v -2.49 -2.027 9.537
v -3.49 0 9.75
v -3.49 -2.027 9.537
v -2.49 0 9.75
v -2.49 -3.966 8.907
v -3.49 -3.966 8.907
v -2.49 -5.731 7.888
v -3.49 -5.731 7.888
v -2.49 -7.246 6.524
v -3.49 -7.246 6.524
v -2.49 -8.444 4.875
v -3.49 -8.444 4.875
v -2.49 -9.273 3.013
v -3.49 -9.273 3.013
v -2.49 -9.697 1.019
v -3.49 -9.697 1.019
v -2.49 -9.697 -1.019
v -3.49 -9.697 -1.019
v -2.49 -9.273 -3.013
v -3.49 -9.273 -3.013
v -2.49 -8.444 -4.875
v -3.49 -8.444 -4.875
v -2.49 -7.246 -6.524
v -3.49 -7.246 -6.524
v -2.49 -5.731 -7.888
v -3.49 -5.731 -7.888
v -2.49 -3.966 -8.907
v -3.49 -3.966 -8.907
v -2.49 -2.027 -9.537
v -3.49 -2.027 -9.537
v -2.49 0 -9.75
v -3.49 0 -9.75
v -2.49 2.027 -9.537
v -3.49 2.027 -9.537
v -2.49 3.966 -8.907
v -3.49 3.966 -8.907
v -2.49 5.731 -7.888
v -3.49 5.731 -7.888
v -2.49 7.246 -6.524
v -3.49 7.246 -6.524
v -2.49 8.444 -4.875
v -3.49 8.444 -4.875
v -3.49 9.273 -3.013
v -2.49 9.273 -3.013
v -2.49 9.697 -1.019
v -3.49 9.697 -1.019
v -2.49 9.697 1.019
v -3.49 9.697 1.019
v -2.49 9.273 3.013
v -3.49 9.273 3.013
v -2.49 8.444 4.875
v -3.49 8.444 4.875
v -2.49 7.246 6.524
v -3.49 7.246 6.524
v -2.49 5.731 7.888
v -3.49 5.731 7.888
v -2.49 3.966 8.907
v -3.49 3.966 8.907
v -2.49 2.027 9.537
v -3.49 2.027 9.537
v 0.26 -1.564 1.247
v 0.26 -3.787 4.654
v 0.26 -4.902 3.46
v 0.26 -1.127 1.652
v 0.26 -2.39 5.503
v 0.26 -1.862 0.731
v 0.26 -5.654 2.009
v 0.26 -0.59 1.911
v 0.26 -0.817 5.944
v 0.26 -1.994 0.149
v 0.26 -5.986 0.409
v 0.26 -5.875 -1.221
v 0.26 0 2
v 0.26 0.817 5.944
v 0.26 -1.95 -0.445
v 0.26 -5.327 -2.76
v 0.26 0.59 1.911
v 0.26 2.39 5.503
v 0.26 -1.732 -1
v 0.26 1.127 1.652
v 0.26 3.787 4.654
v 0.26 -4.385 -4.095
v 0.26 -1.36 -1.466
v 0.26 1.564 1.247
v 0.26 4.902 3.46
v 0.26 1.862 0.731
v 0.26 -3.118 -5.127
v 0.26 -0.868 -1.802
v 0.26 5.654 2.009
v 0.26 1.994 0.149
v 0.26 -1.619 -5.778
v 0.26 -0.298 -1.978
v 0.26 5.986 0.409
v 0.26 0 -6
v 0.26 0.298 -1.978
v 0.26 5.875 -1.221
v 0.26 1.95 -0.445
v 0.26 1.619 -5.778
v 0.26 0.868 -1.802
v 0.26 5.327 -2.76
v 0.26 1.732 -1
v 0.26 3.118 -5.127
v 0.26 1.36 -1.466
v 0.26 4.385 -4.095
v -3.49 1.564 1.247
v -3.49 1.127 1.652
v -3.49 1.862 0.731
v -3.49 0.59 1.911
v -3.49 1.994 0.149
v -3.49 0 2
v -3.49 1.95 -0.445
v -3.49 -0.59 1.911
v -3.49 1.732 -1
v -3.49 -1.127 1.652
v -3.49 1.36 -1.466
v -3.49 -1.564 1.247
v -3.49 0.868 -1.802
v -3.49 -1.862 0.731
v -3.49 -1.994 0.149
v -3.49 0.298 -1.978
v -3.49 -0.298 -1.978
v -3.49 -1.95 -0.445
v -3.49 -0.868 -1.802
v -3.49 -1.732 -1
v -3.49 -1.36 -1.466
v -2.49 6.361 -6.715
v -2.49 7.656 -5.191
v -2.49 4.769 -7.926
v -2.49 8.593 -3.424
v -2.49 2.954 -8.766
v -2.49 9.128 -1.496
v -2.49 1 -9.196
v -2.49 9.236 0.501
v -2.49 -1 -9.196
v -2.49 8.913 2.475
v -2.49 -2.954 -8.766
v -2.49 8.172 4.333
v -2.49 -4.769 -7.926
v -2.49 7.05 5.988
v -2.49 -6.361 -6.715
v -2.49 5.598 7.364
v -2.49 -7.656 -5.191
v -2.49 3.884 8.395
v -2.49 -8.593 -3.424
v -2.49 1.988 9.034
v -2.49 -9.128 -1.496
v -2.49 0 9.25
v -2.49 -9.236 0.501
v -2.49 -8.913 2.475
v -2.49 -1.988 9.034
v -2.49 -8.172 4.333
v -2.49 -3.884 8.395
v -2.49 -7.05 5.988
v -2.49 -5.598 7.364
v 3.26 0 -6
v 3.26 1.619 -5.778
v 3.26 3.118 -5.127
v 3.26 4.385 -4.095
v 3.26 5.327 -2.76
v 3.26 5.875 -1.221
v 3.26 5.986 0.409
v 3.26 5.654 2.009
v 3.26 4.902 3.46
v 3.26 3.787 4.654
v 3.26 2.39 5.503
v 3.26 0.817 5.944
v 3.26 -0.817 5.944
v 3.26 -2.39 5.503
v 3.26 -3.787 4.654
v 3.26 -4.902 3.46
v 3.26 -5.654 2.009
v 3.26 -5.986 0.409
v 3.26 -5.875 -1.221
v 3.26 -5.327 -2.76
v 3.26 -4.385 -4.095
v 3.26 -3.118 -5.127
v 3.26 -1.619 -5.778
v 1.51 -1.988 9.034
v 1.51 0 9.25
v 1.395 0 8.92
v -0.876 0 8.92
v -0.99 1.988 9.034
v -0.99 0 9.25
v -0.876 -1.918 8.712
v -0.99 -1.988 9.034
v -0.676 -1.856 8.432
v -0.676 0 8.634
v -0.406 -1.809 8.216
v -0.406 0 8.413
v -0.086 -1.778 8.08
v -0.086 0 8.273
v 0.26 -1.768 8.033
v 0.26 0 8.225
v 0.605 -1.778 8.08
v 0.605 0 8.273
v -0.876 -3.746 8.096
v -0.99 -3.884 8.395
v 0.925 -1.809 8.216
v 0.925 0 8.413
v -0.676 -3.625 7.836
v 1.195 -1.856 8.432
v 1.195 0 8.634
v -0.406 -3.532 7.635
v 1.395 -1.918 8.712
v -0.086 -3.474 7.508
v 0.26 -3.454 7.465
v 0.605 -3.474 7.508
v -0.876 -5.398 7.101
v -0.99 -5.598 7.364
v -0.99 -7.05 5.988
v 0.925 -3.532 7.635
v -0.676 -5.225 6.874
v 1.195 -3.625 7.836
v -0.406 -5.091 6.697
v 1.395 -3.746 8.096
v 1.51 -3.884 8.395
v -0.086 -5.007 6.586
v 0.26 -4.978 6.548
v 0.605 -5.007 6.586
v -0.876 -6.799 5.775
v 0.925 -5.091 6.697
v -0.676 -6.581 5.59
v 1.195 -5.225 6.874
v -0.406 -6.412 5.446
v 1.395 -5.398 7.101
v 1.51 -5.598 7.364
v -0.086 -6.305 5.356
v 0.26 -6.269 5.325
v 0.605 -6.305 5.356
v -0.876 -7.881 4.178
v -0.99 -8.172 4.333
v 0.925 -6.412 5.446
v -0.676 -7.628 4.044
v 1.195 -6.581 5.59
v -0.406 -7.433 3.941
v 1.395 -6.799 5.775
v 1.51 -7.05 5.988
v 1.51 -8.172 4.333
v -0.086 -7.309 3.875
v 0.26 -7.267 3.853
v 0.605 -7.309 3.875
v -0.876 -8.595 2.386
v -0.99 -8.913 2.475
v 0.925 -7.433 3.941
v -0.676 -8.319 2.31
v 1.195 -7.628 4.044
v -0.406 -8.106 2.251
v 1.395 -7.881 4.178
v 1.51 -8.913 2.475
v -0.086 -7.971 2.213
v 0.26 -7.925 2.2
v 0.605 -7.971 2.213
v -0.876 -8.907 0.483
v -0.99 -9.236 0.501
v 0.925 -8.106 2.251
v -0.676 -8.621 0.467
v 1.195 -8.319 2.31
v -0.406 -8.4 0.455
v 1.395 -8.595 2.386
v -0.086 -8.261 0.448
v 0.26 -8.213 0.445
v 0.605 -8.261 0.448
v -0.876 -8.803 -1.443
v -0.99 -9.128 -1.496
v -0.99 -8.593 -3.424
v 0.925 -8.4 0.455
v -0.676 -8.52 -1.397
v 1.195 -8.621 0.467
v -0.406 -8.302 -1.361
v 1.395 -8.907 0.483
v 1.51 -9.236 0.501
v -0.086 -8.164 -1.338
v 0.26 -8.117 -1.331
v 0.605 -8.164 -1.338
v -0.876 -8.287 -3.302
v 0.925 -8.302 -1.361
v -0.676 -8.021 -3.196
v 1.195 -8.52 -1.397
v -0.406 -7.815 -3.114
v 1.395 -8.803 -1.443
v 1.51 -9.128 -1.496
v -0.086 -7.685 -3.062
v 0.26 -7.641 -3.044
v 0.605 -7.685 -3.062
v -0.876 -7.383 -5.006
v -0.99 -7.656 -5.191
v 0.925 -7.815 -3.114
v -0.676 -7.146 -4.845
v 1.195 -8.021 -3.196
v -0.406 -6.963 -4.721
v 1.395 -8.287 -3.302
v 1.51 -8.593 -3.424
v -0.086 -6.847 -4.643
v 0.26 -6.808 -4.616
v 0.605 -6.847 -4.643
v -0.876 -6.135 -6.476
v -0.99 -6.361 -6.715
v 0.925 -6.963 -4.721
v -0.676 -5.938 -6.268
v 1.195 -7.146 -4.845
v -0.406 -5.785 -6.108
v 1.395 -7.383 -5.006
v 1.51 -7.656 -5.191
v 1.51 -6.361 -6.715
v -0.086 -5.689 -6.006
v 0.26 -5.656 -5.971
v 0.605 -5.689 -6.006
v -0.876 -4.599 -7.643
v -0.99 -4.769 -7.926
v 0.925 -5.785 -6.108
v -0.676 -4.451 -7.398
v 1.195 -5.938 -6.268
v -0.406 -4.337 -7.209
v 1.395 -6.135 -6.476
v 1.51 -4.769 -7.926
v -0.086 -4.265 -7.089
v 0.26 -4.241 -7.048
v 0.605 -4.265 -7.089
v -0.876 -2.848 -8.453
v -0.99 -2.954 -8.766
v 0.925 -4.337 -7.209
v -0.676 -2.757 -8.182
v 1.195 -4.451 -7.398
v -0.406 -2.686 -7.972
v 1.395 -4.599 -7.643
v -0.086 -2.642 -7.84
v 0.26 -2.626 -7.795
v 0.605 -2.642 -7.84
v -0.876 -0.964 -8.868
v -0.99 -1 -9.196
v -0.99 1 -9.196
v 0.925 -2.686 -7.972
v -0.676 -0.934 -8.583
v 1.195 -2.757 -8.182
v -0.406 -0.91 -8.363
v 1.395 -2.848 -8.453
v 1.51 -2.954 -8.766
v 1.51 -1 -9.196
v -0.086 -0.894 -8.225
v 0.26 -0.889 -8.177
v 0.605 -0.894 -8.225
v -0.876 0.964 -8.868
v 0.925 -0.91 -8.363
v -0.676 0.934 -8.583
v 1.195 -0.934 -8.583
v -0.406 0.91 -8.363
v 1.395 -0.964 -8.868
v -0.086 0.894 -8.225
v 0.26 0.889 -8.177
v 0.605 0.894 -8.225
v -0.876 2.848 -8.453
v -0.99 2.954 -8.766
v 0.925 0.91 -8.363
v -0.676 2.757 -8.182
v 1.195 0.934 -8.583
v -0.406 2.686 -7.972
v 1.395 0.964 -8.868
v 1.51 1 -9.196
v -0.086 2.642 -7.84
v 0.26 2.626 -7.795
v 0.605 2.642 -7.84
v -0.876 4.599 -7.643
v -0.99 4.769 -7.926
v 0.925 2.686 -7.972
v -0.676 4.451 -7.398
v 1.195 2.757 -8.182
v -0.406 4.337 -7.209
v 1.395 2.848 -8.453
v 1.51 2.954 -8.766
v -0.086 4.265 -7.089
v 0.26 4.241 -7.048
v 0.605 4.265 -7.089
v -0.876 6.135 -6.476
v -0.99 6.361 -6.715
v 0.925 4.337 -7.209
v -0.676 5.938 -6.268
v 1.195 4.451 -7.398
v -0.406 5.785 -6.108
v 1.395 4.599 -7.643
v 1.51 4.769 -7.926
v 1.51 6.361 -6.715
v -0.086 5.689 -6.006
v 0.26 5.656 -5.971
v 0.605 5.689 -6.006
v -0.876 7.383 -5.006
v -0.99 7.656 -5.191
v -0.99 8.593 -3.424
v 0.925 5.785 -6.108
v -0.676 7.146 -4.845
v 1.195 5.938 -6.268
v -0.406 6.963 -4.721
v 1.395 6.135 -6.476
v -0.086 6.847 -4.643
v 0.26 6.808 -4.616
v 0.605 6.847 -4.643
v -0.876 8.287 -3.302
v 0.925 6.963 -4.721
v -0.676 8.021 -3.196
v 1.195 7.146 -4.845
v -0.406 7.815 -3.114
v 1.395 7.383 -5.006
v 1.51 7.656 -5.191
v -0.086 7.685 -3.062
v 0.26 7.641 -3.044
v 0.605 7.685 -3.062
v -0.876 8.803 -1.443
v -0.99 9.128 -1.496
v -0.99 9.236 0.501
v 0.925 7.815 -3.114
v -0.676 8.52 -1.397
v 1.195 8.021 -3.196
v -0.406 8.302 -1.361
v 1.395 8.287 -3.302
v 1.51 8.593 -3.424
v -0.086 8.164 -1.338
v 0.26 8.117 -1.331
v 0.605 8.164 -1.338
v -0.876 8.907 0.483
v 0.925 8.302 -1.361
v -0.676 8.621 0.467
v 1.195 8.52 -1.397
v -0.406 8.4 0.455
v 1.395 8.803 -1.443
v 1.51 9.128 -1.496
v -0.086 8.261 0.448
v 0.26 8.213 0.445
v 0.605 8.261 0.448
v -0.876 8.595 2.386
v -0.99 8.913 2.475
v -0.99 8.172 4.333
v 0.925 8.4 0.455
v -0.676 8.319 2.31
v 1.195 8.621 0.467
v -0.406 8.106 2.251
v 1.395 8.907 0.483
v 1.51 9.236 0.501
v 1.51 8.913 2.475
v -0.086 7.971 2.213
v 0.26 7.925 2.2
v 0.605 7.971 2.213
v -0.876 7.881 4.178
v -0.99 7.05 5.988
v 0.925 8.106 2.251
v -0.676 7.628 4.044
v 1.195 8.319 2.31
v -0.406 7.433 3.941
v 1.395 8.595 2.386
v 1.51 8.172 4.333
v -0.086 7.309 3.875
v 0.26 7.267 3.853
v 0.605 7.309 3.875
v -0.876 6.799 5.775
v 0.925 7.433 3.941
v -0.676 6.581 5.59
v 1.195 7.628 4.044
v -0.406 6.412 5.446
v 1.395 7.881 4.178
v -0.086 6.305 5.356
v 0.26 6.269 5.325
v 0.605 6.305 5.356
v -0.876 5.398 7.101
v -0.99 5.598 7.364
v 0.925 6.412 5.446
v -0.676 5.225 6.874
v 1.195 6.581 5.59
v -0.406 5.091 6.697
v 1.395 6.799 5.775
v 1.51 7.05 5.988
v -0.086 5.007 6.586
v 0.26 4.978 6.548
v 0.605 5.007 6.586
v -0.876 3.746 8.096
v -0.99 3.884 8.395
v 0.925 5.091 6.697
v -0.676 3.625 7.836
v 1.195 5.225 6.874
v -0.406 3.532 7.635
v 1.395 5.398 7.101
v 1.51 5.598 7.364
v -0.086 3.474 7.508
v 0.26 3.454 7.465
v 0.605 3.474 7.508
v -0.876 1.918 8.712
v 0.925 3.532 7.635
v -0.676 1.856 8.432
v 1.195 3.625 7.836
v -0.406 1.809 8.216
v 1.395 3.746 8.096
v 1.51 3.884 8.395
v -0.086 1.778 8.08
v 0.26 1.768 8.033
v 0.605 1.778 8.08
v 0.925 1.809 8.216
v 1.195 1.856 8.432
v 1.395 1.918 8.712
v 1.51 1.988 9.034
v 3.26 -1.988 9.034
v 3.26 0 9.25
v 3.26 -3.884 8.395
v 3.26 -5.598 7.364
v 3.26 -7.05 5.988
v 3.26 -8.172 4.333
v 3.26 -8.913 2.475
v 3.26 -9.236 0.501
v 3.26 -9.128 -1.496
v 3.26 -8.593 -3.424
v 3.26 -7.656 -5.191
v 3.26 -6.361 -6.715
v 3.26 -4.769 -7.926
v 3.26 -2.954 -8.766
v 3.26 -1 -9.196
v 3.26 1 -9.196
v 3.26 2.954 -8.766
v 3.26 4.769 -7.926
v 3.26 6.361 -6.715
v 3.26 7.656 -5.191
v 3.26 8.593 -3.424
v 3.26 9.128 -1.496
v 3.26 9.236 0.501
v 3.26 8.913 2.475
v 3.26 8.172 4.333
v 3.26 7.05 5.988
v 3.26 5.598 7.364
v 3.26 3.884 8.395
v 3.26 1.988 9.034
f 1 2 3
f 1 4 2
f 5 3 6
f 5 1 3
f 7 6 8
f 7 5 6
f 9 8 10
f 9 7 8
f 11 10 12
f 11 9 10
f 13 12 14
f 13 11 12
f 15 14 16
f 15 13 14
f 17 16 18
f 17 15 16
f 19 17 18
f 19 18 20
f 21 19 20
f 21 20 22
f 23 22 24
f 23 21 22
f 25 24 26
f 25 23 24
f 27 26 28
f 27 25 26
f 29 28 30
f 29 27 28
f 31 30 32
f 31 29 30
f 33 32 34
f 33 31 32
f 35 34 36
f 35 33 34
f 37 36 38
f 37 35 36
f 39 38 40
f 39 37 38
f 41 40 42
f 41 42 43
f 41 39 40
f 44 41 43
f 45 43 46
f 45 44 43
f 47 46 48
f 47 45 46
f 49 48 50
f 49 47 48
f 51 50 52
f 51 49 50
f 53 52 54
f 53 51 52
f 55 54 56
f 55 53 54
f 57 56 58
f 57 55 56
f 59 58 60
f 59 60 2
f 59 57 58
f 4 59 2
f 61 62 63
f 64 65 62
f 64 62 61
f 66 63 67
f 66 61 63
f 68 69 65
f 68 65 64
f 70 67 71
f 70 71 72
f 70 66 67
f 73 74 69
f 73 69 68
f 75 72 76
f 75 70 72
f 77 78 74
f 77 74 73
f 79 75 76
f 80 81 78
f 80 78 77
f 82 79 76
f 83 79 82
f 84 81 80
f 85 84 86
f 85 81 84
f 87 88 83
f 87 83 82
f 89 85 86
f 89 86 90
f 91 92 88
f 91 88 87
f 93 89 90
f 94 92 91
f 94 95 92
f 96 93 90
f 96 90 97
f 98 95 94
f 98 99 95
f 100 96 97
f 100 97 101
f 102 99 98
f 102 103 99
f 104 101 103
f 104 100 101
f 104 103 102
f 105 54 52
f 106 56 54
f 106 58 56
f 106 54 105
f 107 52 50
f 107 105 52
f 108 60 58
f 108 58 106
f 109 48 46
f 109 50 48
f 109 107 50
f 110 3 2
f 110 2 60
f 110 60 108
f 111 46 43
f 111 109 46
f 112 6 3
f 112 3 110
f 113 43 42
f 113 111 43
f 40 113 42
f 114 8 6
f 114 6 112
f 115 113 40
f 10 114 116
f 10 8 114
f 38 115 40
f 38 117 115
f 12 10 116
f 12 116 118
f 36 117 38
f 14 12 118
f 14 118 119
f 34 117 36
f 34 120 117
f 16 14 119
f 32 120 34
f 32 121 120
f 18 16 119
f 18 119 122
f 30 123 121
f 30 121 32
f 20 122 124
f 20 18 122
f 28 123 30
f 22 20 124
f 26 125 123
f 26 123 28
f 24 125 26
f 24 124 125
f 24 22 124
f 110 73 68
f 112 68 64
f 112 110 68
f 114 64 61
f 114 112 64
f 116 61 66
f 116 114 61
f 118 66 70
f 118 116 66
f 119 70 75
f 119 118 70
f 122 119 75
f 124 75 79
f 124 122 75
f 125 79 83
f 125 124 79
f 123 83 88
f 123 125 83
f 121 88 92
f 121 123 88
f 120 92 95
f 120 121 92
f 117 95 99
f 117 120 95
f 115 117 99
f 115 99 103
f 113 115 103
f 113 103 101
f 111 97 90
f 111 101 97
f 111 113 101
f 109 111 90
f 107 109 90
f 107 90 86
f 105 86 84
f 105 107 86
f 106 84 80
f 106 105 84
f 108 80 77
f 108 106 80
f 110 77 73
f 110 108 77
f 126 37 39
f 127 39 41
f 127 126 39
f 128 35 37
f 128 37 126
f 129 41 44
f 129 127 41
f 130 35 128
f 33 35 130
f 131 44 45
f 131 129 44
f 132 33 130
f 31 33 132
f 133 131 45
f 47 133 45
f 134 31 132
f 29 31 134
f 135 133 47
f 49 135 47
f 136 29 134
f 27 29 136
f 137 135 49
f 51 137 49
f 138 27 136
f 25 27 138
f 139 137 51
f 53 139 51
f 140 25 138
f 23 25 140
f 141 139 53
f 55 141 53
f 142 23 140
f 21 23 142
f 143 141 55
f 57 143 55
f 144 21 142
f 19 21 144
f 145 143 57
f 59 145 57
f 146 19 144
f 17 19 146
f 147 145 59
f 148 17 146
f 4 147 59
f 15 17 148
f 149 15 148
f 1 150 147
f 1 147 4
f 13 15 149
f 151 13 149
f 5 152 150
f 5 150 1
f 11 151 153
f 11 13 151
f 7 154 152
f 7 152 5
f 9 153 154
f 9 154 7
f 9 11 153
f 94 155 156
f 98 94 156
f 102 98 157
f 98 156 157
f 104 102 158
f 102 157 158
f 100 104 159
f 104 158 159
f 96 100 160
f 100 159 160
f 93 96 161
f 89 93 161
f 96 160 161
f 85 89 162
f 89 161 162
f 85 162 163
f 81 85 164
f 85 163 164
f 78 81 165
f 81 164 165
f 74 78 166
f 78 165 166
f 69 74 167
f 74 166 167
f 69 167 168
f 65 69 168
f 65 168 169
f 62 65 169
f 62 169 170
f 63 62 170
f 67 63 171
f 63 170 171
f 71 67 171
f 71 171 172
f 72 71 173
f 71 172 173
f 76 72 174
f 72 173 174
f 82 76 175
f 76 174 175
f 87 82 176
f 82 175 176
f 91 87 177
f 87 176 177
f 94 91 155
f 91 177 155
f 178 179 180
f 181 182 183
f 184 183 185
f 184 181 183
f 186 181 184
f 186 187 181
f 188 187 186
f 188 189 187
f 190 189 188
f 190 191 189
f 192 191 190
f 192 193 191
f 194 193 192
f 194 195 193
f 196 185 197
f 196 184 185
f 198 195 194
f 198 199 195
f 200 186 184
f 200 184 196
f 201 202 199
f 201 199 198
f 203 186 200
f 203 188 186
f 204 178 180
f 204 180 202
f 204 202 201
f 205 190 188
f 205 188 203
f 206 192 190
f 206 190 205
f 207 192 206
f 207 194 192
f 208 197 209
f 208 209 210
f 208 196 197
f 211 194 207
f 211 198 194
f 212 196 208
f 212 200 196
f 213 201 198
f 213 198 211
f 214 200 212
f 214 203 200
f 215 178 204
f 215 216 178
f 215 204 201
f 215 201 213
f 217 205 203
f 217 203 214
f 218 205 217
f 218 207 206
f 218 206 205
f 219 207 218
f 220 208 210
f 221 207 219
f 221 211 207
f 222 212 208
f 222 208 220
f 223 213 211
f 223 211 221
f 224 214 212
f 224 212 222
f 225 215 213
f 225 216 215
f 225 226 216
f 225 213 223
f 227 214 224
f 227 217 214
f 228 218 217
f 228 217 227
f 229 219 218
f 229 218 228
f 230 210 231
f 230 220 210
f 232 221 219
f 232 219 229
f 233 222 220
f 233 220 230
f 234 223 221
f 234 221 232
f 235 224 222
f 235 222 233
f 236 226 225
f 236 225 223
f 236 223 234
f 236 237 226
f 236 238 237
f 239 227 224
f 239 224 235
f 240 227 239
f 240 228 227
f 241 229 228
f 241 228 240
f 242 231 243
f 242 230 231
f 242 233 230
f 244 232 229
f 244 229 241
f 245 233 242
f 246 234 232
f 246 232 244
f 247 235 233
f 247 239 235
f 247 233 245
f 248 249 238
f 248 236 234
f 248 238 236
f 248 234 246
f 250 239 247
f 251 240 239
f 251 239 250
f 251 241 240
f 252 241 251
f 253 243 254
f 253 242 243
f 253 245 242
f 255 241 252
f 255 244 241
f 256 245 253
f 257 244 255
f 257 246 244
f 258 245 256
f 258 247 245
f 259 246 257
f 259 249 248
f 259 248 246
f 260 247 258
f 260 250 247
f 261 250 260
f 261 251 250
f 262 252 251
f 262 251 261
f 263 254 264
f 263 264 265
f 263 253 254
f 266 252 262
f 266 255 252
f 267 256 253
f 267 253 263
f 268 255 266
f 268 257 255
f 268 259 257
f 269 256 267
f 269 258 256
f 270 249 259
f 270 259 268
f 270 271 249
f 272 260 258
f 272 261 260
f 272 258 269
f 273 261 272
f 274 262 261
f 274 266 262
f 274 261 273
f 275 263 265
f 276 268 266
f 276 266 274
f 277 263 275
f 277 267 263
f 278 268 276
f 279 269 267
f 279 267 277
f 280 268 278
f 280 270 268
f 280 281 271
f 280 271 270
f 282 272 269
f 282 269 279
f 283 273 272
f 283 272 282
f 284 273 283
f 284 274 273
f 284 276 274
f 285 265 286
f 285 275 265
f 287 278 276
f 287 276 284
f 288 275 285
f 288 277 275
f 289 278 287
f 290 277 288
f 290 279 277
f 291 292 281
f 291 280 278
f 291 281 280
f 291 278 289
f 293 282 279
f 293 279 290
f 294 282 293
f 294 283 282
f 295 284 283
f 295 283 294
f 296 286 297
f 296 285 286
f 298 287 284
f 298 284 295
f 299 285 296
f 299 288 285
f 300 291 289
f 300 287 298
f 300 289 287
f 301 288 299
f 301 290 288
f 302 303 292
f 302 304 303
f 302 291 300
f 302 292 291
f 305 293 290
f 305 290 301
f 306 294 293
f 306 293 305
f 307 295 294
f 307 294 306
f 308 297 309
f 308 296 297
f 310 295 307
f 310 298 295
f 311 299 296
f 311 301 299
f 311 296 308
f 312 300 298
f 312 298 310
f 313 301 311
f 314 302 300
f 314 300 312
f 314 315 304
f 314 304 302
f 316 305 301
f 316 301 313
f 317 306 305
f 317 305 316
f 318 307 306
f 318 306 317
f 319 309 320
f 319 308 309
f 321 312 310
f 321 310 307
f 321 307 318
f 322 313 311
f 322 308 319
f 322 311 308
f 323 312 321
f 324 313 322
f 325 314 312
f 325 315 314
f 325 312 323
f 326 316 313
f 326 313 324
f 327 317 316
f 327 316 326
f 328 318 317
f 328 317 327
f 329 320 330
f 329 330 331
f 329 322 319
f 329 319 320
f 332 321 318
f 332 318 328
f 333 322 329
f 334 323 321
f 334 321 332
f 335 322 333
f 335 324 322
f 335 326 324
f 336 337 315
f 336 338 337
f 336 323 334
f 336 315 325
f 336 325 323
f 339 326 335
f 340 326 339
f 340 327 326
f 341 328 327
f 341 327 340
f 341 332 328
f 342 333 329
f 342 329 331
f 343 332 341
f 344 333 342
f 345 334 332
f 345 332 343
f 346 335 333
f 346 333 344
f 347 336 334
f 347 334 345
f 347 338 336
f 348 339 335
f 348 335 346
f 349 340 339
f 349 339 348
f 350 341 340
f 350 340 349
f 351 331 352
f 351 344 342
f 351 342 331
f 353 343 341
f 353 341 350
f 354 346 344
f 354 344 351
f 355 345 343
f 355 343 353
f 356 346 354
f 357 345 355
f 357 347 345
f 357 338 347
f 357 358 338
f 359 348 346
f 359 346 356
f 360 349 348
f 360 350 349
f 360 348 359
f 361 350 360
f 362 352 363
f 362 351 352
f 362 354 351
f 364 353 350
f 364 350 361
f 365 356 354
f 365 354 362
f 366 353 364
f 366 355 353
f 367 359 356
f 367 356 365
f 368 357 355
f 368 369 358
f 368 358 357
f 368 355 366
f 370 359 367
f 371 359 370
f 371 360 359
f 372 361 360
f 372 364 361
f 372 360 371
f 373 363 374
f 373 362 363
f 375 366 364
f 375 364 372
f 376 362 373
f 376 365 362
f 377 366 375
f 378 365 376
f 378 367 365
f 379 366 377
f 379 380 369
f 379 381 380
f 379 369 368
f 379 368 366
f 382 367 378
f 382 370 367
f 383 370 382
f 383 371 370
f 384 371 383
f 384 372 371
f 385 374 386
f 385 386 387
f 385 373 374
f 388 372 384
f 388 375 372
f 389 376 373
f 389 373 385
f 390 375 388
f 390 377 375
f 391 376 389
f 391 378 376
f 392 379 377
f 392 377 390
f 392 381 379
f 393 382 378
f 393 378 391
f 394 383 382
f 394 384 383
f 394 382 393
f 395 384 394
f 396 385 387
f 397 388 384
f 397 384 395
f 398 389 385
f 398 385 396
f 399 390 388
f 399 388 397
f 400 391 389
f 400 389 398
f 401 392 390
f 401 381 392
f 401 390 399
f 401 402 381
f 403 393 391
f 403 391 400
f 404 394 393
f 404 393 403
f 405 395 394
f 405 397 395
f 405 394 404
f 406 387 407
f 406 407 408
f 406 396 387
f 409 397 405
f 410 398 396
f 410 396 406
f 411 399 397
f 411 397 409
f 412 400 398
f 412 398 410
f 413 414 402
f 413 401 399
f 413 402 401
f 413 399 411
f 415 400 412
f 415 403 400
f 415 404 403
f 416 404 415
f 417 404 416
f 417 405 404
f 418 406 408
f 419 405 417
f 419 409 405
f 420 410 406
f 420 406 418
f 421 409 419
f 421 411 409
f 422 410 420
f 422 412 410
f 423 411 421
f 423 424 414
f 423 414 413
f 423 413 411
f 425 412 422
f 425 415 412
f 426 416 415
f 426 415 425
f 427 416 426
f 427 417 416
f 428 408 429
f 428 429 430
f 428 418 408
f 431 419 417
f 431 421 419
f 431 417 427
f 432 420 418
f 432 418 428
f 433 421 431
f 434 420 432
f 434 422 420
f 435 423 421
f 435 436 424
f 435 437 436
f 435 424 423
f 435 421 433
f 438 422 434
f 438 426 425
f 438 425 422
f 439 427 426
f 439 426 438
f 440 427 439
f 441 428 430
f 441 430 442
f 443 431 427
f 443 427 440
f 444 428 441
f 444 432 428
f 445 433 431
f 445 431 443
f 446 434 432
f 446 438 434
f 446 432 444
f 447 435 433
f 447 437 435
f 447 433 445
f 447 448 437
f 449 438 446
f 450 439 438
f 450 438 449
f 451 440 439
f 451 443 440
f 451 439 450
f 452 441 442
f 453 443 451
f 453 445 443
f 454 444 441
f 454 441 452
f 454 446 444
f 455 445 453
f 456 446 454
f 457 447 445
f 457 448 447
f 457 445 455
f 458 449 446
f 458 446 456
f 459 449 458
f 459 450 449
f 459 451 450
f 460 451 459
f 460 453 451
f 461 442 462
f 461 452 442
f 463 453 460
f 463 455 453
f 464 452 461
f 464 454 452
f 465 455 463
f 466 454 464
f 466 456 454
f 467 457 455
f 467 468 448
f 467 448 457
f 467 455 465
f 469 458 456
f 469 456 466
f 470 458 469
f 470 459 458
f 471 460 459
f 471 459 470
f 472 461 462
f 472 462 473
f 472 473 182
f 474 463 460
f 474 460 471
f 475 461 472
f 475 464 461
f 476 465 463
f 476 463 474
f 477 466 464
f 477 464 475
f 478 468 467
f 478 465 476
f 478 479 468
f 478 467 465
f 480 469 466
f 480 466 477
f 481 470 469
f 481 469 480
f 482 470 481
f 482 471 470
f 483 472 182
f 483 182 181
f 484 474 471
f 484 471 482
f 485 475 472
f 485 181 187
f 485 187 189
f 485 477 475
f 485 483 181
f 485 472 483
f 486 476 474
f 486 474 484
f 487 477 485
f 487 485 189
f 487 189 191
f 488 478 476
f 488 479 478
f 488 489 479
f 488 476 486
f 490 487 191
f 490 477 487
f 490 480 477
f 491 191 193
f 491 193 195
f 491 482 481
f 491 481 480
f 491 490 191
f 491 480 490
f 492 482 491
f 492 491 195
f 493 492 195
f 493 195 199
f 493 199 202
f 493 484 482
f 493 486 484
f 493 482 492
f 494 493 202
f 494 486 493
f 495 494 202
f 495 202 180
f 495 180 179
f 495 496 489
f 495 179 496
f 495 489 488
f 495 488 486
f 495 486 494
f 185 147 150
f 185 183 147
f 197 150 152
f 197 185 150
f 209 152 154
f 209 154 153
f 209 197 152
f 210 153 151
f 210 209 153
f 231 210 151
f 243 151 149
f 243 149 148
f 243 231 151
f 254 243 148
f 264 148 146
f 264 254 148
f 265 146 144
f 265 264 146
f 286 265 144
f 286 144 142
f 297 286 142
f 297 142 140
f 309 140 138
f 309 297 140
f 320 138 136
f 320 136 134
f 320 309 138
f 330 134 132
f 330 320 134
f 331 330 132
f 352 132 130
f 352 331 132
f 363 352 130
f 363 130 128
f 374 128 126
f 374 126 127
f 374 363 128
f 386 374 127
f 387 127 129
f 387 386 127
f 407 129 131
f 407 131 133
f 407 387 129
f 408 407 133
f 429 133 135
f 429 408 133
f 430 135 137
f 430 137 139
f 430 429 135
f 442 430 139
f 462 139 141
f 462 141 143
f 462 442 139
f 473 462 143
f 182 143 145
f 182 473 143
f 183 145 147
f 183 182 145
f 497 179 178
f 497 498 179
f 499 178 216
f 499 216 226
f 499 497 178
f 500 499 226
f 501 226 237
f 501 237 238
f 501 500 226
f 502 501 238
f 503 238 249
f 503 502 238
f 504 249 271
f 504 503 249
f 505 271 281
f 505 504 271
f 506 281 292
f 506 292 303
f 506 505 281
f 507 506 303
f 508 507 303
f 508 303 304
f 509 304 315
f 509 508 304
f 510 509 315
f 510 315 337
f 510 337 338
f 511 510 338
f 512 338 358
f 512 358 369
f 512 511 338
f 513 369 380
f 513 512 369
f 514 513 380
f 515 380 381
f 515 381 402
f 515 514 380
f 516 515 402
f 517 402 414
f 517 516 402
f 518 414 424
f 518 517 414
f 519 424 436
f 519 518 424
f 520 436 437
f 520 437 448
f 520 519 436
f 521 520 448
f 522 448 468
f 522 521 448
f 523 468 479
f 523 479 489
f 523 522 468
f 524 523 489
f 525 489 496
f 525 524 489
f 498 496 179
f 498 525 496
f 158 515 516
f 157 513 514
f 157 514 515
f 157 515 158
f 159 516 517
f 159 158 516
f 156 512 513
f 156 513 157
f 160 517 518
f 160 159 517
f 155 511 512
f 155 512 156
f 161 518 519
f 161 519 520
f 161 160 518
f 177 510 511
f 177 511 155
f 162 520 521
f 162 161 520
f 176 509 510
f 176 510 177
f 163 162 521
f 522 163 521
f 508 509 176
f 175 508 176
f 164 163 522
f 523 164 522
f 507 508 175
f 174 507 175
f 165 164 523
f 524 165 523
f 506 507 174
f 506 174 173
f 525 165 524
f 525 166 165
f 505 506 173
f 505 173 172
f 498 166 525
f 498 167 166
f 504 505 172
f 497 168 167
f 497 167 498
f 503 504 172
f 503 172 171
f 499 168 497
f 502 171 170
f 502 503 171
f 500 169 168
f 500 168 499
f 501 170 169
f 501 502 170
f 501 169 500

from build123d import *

# Parameters (mm, degrees)
SKETCH2_R          = 6
CUT_EXTRUDE1_DEPTH = 3


with BuildPart() as part:
    # Sketch1 → Revolve1 (revolve)
    with BuildSketch(Plane(origin=(0, 0, 0), x_dir=(1, 0, 0), z_dir=(0, 1, 0)), mode=Mode.PRIVATE) as revolve1_sk:
        with BuildLine():
            Line((-3.490371622, 9.75), (-2.490371622, 9.75))
            Line((-2.490371622, 9.75), (-2.490371622, 9.25))
            Line((-2.490371622, 9.25), (-0.990371622, 9.25))
            ThreePointArc((-0.990371622, 9.25), (0.259628378, 8.225245122), (1.509628378, 9.25))
            Line((1.509628378, 9.25), (3.259628378, 9.25))
            Line((3.259628378, 9.25), (3.259628378, 2))
            Line((3.259628378, 2), (-3.490371622, 2))
            Line((-3.490371622, 2), (-3.490371622, 9.75))
        make_face()
    revolve(revolve1_sk.sketch.rotate(Axis((-2.728053472, 0, 0), (1, 0, 0)), 180), axis=Axis((-2.728053472, 0, 0), (1, 0, 0)))

    # Sketch2 → Cut-Extrude1 (cut)
    with BuildSketch(Plane(origin=(3.259628378, 0, 0), x_dir=(0, 0, -1), z_dir=(1, 0, 0))):
        Circle(SKETCH2_R)
    extrude(amount=-CUT_EXTRUDE1_DEPTH, mode=Mode.SUBTRACT)


solid = part.part
